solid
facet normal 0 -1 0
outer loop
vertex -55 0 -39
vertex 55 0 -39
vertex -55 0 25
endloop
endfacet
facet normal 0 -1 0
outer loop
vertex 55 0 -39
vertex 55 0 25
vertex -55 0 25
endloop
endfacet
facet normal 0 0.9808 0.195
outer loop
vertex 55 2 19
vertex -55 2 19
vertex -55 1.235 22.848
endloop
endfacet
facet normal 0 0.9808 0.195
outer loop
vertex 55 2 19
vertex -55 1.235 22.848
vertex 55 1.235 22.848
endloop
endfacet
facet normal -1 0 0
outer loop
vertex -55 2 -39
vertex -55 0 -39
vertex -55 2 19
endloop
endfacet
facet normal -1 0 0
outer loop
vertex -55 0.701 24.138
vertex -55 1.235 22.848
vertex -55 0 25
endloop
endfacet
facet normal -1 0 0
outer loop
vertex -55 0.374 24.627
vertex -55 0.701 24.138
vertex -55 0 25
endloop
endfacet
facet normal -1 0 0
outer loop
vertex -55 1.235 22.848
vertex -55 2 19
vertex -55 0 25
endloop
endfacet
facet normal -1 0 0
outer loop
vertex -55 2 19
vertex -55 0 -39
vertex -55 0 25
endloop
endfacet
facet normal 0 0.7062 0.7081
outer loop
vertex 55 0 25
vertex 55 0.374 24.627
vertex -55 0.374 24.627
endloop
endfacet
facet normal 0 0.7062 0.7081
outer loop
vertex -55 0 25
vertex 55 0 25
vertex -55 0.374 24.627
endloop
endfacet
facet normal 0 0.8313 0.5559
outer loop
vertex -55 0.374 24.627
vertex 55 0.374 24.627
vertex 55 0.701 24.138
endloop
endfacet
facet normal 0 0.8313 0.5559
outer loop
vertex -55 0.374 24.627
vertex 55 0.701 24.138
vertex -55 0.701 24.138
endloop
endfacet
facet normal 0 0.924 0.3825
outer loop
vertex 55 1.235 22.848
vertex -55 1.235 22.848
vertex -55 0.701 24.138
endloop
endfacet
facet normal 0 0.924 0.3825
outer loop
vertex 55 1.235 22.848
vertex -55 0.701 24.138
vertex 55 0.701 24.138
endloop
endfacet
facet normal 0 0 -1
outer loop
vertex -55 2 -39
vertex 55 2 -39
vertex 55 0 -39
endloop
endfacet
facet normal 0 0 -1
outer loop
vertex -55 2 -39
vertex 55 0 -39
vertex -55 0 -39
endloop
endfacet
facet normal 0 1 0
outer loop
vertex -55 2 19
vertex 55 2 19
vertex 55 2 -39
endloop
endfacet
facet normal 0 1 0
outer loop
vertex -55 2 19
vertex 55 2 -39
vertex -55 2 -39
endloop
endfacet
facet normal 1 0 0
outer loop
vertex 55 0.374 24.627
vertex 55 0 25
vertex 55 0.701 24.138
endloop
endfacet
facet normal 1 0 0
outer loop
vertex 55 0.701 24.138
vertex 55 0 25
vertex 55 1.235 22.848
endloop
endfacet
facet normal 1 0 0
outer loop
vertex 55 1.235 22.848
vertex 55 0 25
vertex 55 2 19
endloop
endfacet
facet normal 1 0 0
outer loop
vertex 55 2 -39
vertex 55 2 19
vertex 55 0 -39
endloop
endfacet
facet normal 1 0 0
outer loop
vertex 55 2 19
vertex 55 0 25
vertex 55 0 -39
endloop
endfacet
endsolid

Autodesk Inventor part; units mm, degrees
ref_plane "YZ Plane" through (0, 0, 0) normal (1, 0, 0) x (0, 1, 0)
ref_plane "XZ Plane" through (0, 0, 0) normal (0, 1, 0) x (-1, 0, 0)
ref_plane "XY Plane" through (0, 0, 0) normal (0, 0, 1) x (1, 0, 0)
sketch "Sketch1" plane through (0, 0, 0) normal (0, 1, 0) x (-1, 0, 0)
  line L0 (55, 25) -> (-55, 25)
  line L1 (-55, 25) -> (-55, -25)
  line L2 (-55, -25) -> (55, -25)
  line L3 (55, -25) -> (55, 25)
  line L4 (55, 25) -> (-55, -25) construction
  line L5 (-55, 25) -> (55, -25) construction
  point P0 (0, 0)
  dimension "d0" = 110
  dimension "d1" = 50
extrude "Extrusion1" add sketch "Sketch1" along normal blind 2
sketch "Sketch2" plane through (55, 0, -25) normal (0, 0, -1) x (-1, 0, 0)
  line L0 (0, 2) -> (110, 2) projected
  line L1 (110, 0.5858) -> (110, 0) projected
  line L2 (0, 2) -> (110, 2)
  line L3 (110, 2) -> (110, 0)
  line L4 (110, 0) -> (0, 0)
  line L5 (0, 0) -> (0, 2)
  point P0 (55, 0)
extrude "Extrusion2" add sketch "Sketch2" along normal blind 14
chamfer "Chamfer4" distance 2 angle 45 1 edges at (0, 2, 25)
chamfer "Chamfer5" distance 2 angle 45 1 edges at (0, 2, 23.0005)
chamfer "Chamfer6" distance 2 angle 45 1 edges at (0, 2, 21.0005)
chamfer "Chamfer7" distance 0.3 angle 45 1 edges at (0, 0.5858, 24.4147)
properties part number "Empuja"
